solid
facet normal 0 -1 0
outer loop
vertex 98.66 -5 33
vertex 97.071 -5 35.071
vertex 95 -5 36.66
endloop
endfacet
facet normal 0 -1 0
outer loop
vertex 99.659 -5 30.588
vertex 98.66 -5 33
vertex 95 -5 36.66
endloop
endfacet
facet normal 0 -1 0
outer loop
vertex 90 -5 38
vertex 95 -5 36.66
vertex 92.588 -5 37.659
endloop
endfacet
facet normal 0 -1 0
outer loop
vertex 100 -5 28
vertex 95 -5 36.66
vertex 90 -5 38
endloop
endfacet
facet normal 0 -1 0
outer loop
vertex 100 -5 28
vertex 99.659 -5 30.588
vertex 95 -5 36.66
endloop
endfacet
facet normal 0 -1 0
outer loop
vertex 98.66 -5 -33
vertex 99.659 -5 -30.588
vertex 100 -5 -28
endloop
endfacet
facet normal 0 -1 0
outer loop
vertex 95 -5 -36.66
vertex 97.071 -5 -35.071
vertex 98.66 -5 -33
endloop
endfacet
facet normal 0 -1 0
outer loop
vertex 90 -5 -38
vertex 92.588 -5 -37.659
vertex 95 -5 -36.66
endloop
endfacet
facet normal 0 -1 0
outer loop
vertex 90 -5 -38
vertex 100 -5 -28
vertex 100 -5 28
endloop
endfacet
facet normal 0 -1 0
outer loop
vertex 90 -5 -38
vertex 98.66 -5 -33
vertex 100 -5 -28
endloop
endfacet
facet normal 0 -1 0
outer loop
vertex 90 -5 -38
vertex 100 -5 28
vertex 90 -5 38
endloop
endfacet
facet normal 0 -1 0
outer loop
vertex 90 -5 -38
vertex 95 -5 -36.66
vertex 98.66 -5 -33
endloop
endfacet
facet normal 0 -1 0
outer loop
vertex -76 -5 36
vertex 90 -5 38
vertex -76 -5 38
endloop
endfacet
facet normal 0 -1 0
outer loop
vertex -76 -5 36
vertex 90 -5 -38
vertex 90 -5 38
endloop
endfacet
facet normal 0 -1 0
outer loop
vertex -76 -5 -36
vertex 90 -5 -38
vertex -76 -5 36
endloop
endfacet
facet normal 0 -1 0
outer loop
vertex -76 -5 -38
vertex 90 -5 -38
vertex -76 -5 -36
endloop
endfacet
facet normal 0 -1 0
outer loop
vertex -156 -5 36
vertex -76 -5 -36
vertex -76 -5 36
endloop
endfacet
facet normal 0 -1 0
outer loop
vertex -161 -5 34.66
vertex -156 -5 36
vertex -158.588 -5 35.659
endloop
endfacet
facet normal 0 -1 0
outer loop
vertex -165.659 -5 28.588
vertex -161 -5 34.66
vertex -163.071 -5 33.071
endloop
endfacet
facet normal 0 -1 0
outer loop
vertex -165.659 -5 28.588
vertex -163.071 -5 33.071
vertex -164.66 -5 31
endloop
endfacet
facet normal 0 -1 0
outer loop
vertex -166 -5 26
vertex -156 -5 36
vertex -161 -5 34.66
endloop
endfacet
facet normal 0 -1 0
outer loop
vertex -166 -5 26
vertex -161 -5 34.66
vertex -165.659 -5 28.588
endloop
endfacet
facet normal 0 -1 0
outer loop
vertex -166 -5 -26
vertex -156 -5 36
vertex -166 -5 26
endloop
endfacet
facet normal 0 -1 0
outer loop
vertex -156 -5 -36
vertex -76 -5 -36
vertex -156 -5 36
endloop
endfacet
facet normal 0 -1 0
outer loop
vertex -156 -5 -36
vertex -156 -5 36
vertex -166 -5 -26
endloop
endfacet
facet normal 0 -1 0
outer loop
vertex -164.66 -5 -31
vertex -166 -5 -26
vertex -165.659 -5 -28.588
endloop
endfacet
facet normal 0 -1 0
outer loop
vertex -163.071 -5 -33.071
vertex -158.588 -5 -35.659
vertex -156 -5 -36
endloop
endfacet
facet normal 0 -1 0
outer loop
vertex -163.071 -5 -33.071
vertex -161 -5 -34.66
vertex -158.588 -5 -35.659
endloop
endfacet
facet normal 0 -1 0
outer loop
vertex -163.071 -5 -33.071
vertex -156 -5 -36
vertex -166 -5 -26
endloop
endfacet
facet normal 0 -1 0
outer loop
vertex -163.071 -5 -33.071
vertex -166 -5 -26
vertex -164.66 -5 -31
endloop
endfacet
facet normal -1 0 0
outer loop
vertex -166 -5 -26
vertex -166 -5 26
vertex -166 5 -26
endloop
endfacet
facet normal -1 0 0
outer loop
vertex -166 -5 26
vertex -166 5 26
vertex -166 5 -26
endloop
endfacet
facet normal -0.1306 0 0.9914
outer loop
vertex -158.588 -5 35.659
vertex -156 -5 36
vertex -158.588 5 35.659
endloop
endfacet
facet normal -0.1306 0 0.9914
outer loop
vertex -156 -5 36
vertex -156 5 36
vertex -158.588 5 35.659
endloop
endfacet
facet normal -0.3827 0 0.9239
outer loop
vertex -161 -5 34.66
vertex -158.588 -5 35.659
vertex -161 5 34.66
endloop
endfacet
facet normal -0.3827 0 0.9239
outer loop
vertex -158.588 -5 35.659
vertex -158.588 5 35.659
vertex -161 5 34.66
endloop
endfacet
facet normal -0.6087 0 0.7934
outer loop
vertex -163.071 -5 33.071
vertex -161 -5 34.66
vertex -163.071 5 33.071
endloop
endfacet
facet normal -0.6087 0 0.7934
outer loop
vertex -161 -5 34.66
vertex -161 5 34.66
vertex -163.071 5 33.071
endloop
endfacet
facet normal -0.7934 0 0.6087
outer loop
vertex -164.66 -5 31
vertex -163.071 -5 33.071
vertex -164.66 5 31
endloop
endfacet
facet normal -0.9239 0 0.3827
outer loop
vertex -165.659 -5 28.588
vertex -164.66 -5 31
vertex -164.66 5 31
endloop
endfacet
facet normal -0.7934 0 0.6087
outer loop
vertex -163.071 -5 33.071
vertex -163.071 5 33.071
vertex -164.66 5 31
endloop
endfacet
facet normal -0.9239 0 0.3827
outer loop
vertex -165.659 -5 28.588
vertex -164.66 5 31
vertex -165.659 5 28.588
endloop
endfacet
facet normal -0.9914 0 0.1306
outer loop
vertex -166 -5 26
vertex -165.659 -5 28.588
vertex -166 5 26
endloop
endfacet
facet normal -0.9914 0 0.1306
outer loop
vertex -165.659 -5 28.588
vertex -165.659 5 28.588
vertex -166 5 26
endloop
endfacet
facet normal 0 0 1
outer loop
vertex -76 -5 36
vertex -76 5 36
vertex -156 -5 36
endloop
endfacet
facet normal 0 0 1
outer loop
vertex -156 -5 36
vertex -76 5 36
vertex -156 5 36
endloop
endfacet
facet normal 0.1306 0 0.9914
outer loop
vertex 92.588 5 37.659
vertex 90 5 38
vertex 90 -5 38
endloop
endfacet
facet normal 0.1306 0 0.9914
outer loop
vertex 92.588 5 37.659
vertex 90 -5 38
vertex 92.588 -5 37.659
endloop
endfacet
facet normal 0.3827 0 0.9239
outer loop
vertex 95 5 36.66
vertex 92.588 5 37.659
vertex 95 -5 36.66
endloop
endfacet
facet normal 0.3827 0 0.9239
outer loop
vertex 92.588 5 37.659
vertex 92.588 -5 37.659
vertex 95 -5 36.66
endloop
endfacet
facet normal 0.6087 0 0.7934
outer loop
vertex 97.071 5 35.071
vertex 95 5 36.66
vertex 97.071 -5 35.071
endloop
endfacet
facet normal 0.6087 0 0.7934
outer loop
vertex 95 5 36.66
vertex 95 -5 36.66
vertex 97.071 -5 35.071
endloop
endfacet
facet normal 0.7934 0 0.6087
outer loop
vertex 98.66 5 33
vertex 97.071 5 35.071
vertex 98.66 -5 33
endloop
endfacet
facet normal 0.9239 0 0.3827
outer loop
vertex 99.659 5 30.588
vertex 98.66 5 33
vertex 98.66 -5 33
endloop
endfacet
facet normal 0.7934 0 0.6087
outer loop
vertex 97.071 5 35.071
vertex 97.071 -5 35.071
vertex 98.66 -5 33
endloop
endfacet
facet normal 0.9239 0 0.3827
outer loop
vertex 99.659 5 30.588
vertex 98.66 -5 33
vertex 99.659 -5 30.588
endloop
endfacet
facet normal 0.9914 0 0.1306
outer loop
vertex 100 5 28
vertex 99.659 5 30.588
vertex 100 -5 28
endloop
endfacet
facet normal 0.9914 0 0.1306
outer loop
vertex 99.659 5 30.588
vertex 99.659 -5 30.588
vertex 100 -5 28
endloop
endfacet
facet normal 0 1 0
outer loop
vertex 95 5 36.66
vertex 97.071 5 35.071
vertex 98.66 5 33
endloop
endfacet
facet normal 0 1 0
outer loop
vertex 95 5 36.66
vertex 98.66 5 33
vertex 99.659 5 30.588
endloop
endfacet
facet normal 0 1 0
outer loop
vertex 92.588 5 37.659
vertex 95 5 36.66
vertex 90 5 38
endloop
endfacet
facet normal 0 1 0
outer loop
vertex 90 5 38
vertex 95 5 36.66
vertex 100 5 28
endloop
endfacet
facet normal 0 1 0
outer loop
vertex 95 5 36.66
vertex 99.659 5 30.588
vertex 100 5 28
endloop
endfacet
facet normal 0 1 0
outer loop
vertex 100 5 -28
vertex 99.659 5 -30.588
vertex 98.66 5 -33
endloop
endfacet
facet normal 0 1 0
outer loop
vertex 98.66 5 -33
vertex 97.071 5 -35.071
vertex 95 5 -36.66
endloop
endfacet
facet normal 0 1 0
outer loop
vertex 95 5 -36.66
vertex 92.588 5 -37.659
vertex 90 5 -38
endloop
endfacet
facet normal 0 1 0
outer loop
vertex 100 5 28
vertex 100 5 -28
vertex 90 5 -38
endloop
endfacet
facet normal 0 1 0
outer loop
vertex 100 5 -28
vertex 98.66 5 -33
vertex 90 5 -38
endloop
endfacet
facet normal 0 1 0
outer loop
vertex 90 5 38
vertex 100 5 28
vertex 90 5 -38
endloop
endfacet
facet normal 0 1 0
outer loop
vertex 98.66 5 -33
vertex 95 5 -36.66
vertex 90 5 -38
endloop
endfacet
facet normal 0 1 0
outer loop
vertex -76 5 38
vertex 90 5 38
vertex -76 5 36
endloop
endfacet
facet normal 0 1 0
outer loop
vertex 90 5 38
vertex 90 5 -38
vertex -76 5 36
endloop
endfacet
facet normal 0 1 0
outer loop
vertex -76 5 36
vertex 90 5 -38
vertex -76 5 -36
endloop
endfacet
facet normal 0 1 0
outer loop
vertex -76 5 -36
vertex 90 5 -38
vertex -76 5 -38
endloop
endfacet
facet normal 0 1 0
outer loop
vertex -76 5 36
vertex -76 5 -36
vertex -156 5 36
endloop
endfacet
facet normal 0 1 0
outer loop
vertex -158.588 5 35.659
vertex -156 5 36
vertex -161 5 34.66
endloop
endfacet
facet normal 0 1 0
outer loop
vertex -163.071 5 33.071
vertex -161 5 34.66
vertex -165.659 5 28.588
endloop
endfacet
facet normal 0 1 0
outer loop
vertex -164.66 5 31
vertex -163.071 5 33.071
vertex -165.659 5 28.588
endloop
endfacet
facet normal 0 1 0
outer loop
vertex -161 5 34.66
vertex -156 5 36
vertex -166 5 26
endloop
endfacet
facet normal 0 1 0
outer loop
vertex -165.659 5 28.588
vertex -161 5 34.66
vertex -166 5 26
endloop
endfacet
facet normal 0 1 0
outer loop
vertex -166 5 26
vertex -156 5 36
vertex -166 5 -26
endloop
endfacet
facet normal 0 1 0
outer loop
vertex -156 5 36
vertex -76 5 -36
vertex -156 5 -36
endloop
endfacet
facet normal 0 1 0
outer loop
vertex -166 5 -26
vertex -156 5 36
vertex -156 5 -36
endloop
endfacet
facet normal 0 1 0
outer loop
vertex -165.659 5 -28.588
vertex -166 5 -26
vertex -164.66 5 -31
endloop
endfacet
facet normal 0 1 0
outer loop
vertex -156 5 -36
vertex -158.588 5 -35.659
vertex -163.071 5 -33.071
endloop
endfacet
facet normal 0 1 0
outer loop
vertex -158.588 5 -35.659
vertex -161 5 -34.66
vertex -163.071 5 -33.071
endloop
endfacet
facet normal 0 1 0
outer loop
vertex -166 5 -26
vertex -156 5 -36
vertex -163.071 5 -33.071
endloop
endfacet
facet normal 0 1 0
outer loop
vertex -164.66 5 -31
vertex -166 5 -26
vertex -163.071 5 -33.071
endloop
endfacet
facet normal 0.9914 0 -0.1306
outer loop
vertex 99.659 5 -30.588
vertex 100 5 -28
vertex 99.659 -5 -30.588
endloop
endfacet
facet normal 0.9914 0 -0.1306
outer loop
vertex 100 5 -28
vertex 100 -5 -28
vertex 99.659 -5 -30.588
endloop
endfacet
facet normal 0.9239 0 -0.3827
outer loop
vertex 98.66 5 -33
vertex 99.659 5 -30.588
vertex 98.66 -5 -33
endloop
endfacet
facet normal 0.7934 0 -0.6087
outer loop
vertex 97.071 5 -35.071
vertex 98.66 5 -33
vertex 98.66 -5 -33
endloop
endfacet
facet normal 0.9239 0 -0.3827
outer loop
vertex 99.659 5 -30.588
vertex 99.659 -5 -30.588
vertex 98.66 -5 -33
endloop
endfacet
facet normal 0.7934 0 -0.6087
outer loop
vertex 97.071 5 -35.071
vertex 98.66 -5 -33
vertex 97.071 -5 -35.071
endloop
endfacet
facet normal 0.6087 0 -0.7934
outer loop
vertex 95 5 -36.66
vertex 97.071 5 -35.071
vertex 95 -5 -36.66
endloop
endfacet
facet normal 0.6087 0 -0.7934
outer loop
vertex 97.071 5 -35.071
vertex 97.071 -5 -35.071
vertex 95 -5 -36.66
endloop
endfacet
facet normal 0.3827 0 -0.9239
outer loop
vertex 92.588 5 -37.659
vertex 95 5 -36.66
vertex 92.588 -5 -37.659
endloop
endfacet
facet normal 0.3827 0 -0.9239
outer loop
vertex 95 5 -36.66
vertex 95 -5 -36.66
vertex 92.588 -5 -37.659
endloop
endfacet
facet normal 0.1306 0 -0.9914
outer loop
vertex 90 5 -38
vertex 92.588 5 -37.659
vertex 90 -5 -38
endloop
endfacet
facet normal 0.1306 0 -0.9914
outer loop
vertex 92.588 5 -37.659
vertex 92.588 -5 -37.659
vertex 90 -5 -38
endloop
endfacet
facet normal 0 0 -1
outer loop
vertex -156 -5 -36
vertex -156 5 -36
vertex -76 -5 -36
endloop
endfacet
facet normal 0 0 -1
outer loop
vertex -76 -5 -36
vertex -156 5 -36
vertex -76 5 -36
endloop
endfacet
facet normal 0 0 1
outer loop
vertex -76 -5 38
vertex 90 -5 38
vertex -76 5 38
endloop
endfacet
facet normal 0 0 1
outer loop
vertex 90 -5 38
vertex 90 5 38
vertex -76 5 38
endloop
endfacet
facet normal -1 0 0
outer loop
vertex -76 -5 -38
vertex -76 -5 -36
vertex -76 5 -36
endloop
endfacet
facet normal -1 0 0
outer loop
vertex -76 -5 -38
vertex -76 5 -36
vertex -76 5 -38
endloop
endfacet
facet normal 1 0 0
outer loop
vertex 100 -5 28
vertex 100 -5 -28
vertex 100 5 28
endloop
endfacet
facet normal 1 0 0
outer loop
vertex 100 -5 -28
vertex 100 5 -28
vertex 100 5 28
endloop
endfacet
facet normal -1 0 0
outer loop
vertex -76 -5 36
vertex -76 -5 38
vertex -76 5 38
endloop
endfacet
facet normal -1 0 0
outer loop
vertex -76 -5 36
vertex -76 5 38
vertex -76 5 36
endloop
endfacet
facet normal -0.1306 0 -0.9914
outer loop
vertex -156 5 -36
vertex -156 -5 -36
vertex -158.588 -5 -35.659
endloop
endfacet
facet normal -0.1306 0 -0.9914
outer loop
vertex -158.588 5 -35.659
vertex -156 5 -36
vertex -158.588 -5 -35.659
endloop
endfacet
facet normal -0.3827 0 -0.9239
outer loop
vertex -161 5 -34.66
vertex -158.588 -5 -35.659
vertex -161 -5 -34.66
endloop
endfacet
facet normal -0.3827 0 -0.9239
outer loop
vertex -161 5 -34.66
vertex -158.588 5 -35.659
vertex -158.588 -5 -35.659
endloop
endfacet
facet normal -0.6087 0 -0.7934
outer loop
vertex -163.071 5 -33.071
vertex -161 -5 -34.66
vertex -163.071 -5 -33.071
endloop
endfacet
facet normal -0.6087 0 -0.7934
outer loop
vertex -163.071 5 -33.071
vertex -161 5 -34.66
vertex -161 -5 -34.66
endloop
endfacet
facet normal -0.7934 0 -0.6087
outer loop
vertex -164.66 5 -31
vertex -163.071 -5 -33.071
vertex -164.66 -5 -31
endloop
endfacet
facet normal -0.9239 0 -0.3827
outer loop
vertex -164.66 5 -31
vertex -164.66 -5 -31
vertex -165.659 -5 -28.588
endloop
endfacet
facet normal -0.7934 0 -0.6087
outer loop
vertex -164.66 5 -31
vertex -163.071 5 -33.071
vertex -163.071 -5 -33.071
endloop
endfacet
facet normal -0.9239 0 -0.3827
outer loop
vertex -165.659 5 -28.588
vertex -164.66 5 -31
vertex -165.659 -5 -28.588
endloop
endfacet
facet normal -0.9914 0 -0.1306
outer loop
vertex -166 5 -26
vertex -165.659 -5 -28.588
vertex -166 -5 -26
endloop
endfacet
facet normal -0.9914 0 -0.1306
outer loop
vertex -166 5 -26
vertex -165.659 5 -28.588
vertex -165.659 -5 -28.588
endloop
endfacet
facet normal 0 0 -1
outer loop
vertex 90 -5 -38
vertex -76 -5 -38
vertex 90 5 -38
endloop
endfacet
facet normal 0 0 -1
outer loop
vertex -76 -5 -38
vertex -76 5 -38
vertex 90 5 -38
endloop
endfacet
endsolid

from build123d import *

# Parameters (mm, degrees)
EXTRUDE_473_DEPTH = 5
FILLET_R_R        = 10


with BuildPart() as part:
    # ｽｹｯﾁ1 → Extrude 473 (new, symmetric)
    with BuildSketch(Plane(origin=(0, 0, 0), x_dir=(1, 0, 0), z_dir=(0, 1, 0))):
        Polygon((-166, 36), (-76, 36), (-76, 38), (100, 38), (100, -38), (-76, -38), (-76, -36), (-166, -36), align=None)
    extrude(amount=EXTRUDE_473_DEPTH, both=True)

    # 外周 角R
    fillet_r_edges = [part.edges().sort_by_distance(p)[0] for p in [
        (-166, 0, -36),
        (100, 0, -38),
        (100, 0, 38),
        (-166, 0, 36),
    ]]
    fillet(fillet_r_edges, radius=FILLET_R_R)


solid = part.part
